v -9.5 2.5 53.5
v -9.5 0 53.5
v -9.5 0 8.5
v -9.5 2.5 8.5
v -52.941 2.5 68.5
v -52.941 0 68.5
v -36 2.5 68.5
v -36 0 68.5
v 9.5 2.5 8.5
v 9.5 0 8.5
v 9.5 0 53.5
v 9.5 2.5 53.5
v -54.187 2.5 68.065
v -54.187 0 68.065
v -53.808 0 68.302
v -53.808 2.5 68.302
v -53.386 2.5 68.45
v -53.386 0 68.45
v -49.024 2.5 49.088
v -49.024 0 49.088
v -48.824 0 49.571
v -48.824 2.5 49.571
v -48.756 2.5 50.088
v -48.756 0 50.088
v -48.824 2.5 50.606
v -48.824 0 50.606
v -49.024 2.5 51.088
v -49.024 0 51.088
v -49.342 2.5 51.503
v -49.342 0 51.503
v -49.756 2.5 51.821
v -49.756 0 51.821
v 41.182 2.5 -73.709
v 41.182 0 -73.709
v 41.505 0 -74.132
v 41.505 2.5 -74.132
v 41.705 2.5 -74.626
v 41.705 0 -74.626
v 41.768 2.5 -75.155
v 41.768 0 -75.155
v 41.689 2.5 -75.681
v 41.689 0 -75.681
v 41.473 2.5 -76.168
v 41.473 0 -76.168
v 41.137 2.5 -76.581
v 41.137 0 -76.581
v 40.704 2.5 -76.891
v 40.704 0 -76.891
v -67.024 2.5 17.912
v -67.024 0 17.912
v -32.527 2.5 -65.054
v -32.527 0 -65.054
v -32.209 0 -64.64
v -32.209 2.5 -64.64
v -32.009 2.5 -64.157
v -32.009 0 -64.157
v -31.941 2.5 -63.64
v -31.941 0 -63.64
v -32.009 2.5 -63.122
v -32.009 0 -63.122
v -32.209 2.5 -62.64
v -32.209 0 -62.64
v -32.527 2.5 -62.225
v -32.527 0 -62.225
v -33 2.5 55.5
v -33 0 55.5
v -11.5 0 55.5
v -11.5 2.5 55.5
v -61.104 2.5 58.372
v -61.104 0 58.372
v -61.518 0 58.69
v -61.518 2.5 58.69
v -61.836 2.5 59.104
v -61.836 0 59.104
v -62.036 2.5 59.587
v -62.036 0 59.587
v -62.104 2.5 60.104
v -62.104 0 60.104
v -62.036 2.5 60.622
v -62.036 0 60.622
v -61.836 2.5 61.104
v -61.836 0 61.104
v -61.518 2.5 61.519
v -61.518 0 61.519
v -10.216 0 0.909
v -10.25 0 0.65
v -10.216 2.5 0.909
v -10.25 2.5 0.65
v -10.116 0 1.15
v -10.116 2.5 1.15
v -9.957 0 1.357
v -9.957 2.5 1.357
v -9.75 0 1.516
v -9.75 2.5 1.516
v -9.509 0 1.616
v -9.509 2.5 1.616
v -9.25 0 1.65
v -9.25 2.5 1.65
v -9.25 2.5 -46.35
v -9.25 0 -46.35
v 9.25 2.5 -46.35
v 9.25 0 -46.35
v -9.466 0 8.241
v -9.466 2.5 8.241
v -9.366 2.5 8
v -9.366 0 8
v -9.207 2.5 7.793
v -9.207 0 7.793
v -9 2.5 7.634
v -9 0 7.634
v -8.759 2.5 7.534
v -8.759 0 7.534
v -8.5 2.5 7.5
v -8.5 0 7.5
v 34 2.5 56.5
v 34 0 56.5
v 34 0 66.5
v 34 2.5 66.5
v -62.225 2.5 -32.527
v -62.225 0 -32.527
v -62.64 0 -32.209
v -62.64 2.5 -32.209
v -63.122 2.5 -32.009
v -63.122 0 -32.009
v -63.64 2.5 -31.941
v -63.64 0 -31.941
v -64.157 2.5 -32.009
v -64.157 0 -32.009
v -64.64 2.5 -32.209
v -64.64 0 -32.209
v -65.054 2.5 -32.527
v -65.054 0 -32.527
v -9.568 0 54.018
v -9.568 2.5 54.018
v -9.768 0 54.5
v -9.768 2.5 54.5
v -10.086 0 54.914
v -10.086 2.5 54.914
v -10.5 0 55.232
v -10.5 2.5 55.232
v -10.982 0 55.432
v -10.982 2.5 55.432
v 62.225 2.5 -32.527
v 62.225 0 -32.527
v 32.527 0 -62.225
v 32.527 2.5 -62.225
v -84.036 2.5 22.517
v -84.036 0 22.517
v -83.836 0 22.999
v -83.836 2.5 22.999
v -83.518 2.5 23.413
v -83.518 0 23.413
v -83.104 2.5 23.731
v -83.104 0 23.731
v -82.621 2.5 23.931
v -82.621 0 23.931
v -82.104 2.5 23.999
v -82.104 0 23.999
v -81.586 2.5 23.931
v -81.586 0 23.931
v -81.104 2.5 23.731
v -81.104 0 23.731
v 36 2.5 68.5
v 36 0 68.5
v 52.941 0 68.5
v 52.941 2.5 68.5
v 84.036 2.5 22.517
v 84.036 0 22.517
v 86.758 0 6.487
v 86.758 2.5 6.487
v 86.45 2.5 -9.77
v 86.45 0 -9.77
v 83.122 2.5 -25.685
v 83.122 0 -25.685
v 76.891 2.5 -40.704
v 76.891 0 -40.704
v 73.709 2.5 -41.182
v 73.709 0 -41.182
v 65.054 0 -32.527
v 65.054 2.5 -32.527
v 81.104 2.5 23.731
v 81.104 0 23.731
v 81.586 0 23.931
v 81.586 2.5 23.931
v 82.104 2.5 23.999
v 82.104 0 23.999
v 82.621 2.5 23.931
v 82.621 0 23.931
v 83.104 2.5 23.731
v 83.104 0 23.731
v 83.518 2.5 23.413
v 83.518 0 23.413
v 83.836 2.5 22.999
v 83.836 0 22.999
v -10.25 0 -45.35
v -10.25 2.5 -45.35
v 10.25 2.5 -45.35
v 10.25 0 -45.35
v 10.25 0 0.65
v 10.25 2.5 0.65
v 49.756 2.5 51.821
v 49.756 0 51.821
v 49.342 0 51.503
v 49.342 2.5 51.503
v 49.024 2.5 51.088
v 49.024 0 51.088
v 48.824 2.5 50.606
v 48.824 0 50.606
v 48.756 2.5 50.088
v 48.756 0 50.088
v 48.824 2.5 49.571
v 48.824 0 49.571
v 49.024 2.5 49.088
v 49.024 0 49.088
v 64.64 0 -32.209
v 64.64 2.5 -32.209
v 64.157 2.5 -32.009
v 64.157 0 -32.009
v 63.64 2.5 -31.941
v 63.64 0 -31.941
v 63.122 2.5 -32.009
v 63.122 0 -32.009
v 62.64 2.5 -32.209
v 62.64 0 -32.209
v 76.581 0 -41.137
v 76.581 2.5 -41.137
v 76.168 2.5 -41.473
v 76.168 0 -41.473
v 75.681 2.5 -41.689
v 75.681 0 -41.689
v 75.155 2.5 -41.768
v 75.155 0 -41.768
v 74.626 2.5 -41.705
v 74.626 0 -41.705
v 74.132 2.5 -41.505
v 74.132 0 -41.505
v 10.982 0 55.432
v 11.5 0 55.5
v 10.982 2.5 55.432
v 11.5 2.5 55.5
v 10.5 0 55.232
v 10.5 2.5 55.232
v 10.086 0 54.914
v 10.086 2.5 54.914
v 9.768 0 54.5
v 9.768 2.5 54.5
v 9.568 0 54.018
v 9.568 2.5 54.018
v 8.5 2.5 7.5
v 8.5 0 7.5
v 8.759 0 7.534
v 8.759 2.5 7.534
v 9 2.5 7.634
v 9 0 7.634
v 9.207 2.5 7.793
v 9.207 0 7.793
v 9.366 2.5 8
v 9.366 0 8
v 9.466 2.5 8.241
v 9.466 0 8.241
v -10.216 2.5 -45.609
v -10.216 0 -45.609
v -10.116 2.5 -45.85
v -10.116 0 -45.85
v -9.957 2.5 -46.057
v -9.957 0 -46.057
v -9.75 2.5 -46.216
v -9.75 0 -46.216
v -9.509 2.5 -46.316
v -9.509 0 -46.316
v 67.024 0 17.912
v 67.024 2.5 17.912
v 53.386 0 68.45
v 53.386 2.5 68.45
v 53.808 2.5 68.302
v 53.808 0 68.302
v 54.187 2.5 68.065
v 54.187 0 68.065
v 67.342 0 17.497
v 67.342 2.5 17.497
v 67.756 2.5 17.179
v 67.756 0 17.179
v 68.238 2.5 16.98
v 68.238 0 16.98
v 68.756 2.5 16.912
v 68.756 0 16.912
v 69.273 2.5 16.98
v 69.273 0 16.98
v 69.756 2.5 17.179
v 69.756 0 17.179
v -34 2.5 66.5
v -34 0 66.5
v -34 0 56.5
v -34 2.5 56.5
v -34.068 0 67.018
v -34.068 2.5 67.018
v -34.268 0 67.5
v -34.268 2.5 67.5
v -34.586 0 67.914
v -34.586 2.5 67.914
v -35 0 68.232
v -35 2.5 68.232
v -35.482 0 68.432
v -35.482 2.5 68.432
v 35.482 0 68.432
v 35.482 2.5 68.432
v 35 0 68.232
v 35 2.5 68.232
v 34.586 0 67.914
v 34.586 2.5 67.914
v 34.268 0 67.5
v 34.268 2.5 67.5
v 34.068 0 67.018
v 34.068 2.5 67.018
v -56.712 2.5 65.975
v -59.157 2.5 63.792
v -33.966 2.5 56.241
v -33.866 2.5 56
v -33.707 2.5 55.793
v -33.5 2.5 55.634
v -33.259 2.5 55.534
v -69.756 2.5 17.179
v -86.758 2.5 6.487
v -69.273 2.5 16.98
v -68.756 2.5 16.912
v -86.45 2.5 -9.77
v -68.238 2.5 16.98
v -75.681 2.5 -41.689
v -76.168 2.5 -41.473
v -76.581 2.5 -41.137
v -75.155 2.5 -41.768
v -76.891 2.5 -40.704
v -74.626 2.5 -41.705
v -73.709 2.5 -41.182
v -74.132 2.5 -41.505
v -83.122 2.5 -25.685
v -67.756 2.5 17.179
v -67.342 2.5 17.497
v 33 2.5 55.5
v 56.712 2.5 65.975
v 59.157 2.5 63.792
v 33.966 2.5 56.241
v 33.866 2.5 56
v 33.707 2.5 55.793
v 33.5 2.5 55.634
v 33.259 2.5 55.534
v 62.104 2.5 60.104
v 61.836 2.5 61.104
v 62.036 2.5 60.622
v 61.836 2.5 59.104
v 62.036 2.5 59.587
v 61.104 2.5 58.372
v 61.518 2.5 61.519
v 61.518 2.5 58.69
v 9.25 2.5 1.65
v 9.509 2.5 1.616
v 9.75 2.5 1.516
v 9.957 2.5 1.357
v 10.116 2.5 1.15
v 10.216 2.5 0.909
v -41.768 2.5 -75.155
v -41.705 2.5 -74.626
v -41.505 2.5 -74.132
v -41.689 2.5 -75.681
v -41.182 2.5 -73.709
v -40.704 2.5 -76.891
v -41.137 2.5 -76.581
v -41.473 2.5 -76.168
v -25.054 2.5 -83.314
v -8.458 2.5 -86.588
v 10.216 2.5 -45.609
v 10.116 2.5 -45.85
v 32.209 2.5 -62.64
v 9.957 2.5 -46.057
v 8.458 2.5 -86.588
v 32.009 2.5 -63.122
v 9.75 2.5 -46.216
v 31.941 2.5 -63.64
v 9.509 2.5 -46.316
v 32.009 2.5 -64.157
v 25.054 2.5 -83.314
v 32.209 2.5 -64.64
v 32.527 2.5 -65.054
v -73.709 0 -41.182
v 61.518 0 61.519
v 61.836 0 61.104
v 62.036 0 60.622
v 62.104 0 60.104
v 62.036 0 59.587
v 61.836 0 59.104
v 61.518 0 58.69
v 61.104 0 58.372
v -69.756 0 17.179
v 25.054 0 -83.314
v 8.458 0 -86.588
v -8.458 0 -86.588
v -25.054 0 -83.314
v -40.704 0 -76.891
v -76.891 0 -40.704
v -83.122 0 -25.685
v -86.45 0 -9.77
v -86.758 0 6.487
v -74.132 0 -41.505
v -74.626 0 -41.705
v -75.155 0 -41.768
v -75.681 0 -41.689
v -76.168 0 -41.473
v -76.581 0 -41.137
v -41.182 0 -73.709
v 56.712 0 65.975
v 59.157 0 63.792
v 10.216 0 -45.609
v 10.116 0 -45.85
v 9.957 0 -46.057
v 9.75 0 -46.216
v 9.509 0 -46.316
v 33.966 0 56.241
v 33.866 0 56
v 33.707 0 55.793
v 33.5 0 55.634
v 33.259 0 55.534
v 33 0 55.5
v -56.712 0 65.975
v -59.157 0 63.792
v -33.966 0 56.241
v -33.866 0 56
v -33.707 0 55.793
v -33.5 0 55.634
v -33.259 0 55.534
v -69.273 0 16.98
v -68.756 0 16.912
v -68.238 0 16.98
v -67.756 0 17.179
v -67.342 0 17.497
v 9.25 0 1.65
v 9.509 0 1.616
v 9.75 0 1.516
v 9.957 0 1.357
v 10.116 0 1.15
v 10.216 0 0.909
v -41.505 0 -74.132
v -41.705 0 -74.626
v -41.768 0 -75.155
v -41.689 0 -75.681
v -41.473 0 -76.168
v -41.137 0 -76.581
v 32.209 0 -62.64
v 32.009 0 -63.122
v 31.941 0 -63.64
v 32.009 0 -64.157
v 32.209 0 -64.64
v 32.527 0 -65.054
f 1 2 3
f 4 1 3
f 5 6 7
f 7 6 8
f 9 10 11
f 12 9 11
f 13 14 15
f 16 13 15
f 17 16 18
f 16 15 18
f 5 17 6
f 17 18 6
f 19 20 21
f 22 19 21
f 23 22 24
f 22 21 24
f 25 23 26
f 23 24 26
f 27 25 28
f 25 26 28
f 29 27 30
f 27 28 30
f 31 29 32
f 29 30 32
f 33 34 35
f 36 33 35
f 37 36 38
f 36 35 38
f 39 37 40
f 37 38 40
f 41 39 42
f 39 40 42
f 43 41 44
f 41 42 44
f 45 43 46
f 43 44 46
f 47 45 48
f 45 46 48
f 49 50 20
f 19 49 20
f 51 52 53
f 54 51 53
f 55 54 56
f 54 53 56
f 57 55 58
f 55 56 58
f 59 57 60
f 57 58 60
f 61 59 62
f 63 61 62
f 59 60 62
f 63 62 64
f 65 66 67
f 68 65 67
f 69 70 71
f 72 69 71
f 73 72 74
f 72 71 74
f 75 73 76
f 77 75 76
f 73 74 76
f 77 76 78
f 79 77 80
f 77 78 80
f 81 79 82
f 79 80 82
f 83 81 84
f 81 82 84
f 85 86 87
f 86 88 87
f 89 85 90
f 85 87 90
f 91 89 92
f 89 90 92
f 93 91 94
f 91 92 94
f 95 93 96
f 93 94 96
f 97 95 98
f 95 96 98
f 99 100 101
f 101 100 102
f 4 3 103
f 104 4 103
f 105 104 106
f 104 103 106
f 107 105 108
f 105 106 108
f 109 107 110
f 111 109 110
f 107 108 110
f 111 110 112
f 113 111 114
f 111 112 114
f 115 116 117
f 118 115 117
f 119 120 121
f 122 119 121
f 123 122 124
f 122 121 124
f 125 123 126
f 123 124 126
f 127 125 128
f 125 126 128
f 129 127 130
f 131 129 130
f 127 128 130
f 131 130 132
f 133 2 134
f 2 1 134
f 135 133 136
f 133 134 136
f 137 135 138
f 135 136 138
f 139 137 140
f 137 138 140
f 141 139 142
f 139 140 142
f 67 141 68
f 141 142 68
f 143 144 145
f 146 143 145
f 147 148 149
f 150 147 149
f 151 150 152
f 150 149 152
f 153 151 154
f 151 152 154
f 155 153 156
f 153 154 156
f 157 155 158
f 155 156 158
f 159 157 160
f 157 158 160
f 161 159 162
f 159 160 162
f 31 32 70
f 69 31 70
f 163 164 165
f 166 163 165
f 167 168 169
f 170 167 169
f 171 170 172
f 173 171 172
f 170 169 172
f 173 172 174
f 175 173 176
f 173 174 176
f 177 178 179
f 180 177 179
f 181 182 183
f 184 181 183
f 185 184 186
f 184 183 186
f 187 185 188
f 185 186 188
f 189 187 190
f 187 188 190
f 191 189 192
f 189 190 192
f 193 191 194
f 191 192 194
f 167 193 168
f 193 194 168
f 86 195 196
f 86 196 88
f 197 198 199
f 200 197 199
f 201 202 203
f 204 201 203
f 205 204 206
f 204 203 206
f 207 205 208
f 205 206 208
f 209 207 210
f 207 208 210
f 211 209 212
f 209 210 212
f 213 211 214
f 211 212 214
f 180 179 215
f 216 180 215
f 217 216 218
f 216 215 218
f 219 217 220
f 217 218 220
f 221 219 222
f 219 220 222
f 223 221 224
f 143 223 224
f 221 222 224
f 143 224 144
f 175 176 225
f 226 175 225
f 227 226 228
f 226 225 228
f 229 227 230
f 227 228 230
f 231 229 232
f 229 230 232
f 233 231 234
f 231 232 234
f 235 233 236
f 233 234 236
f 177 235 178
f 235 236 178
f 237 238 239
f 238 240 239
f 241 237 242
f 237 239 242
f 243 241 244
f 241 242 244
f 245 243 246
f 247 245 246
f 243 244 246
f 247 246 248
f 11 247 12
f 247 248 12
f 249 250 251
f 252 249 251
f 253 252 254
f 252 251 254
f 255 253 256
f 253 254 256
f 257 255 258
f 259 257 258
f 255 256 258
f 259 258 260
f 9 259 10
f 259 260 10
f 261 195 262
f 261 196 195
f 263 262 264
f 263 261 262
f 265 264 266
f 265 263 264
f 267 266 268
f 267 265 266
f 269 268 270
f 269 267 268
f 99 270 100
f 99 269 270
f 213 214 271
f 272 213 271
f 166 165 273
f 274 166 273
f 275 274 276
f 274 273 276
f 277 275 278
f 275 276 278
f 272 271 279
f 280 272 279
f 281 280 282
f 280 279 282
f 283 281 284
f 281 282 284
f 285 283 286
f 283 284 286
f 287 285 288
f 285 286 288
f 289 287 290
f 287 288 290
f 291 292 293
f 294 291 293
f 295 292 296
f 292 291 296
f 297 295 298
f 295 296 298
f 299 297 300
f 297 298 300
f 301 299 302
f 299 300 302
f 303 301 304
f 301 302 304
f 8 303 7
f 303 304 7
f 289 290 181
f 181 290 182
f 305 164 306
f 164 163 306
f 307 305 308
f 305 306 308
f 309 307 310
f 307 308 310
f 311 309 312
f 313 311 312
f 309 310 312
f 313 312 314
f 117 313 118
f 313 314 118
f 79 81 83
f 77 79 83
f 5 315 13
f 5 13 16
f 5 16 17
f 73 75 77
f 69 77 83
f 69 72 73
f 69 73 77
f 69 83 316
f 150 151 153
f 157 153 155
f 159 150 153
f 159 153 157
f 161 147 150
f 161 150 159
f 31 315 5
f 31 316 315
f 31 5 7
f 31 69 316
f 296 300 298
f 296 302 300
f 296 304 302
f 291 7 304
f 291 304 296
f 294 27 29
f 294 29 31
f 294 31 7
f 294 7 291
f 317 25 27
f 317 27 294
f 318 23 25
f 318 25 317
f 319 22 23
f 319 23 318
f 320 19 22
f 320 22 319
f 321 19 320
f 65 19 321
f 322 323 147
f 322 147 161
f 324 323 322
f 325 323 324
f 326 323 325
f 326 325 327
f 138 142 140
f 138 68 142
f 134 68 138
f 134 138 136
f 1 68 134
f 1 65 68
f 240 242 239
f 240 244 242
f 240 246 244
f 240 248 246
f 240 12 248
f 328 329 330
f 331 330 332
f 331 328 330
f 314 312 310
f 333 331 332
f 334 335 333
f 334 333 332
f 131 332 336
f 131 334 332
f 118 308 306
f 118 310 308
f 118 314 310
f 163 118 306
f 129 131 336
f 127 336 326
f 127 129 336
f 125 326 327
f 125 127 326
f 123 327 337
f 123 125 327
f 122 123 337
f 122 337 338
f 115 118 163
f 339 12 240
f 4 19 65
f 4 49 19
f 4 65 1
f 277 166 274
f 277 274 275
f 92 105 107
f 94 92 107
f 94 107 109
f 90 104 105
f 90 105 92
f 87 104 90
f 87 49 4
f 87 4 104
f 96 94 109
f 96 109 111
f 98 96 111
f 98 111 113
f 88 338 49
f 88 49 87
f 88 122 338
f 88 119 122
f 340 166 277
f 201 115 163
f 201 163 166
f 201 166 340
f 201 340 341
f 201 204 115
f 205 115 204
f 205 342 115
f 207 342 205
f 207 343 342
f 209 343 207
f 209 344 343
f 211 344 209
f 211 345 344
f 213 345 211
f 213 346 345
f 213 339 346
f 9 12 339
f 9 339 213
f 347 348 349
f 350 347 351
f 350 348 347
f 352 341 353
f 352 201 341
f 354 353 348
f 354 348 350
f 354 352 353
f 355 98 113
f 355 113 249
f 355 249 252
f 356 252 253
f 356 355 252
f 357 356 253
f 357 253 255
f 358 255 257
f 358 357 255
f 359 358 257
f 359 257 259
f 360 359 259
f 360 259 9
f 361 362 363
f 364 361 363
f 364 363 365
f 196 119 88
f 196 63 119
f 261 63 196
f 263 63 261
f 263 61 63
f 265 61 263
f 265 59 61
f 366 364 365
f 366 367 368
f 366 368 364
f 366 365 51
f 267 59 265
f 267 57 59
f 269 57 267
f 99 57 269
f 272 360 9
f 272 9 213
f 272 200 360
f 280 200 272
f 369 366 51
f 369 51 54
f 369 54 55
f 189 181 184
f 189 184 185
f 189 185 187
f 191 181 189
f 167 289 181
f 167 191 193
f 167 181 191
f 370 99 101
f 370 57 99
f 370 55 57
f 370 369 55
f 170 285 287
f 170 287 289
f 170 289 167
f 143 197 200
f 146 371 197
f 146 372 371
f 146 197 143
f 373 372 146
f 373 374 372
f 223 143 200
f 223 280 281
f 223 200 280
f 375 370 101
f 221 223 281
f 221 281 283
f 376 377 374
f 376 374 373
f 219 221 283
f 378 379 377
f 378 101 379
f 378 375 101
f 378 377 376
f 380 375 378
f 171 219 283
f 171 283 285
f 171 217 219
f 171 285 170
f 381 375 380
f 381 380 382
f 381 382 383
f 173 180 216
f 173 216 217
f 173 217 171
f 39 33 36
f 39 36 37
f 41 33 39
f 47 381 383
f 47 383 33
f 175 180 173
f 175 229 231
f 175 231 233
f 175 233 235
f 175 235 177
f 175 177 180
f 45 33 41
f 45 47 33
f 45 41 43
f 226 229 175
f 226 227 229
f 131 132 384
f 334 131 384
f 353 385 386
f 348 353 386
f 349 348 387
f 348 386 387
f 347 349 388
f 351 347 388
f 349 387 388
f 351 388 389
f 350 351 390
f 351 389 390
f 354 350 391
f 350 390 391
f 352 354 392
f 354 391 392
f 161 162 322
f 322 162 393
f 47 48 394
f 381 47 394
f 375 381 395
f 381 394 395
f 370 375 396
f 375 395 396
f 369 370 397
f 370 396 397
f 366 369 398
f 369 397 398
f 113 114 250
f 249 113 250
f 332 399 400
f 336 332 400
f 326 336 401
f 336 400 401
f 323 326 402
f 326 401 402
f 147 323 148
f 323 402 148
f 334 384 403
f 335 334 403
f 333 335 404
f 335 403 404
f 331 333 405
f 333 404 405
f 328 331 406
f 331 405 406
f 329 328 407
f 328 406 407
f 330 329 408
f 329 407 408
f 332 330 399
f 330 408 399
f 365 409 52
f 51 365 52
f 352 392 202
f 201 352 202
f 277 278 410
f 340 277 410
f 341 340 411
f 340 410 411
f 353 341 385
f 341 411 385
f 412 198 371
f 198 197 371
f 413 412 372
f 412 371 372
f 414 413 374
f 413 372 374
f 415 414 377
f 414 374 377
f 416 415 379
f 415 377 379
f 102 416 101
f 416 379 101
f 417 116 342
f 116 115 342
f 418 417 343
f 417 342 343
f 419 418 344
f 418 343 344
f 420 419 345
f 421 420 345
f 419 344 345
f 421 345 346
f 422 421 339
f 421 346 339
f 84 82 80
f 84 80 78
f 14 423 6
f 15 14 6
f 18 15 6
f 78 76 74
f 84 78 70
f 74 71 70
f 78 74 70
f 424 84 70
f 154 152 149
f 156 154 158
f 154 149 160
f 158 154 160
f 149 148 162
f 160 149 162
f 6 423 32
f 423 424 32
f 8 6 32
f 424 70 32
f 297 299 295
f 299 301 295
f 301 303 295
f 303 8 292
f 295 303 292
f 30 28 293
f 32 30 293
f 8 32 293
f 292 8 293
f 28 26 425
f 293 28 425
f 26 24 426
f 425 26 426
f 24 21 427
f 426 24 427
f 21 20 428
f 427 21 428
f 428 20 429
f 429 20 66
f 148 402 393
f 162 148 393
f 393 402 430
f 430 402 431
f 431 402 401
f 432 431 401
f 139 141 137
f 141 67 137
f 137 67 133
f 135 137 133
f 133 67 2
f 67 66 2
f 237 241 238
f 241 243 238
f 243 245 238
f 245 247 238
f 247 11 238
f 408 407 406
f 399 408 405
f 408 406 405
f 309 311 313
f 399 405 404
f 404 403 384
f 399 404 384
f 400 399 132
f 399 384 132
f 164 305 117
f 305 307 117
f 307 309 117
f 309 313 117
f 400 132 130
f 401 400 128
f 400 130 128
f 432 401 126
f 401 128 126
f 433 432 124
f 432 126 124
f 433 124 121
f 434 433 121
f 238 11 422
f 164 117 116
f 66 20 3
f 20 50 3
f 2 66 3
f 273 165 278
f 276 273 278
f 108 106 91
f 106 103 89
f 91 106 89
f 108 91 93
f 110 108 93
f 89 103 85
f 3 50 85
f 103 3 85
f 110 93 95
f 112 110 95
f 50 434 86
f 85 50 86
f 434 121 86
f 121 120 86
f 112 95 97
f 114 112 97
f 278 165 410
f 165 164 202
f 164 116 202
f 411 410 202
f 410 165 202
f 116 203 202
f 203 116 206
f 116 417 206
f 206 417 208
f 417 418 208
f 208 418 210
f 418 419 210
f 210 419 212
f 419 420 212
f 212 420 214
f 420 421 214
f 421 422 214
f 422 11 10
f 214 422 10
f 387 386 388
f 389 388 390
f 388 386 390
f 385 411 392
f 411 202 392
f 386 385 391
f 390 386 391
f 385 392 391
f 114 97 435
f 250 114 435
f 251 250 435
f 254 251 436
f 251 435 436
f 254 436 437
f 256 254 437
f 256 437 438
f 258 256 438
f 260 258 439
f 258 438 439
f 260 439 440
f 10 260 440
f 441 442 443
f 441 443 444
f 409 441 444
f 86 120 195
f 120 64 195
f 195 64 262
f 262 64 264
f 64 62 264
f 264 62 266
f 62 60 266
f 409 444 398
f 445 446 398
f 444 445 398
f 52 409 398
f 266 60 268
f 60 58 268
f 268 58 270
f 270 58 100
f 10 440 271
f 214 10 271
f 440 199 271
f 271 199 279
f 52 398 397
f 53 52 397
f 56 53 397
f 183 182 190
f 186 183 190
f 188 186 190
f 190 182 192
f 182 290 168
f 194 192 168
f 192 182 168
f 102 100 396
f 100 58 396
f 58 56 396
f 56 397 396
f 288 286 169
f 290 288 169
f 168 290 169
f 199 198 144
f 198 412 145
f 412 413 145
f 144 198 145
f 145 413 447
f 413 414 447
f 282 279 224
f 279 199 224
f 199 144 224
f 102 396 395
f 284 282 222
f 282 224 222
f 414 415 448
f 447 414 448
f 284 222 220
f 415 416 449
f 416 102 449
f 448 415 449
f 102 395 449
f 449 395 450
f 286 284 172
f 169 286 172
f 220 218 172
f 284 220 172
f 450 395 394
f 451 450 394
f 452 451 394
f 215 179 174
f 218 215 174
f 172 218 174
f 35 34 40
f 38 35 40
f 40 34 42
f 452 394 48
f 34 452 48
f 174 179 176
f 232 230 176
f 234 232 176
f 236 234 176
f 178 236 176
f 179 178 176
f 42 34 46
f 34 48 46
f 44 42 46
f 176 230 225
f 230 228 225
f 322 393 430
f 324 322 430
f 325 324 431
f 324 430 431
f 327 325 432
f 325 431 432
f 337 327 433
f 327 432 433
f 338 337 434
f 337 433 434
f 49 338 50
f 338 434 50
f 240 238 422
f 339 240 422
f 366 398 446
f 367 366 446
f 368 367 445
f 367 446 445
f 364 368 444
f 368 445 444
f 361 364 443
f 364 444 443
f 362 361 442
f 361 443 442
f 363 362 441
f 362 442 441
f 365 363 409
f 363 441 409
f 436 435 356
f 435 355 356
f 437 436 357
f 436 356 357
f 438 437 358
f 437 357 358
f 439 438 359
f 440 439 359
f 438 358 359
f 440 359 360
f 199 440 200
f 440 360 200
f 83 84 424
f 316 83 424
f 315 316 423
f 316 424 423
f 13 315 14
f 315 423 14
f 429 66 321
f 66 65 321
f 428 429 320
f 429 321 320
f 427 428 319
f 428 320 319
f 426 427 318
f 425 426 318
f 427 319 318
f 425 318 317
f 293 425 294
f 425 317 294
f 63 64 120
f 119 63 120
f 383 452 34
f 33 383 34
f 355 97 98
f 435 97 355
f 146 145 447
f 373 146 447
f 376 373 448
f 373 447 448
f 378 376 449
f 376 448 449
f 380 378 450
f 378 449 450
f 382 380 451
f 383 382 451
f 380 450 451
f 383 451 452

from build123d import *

# Parameters (mm, degrees)
RESSALTO_EXTRUS_O1_DEPTH = 2.5
ESBO_O13_W               = 20.5
ESBO_O13_H               = 48
CORTE_EXTRUS_O8_DEPTH    = 124.061976256
FILETE1_R                = 2
FILETE2_R                = 1


# Read off the part's stored shape, not the designer's step: Ressalto-extrusão1
with BuildPart() as part:
    # Ressalto-extrusão1 outline → Ressalto-extrusão1 (new body)
    with BuildSketch(Plane(origin=(0, 0, 0), x_dir=(1, 0, 0), z_dir=(0, 1, 0))):
        with BuildLine():
            ThreePointArc((41.182170498, 73.709082433), (41.745717904, 75.420720863), (40.703673569, 76.89090296))
            ThreePointArc((40.703673569, 76.89090296), (0, 87), (-40.703673569, 76.89090296))
            ThreePointArc((-40.703673569, 76.89090296), (-41.745717904, 75.420720863), (-41.182170498, 73.709082433))
            Line((-41.182170498, 73.709082433), (-32.526911935, 65.053823869))
            ThreePointArc((-32.526911935, 65.053823869), (-31.941125497, 63.639610306), (-32.526911935, 62.225396744))
            Line((-32.526911935, 62.225396744), (-62.225396744, 32.526911935))
            ThreePointArc((-62.225396744, 32.526911935), (-63.639610306, 31.941125497), (-65.053823869, 32.526911935))
            Line((-65.053823869, 32.526911935), (-73.709082433, 41.182170498))
            ThreePointArc((-73.709082433, 41.182170498), (-75.420720863, 41.745717904), (-76.89090296, 40.703673569))
            ThreePointArc((-76.89090296, 40.703673569), (-86.449685697, 9.769945899), (-84.035651423, -22.516866789))
            ThreePointArc((-84.035651423, -22.516866789), (-82.869168521, -23.846994955), (-81.103797367, -23.731288475))
            Line((-81.103797367, -23.731288475), (-69.755752861, -17.179491924))
            ThreePointArc((-69.755752861, -17.179491924), (-68.238114771, -16.979691079), (-67.023702054, -17.911542732))
            Line((-67.023702054, -17.911542732), (-49.023702054, -49.088457268))
            ThreePointArc((-49.023702054, -49.088457268), (-48.823901209, -50.606095358), (-49.755752861, -51.820508076))
            Line((-49.755752861, -51.820508076), (-61.103797367, -58.372304626))
            ThreePointArc((-61.103797367, -58.372304626), (-62.086687696, -59.843307652), (-61.518004364, -61.518575561))
            ThreePointArc((-61.518004364, -61.518575561), (-57.944854795, -64.895252544), (-54.186675605, -68.064705882))
            ThreePointArc((-54.186675605, -68.064705882), (-53.600773132, -68.388042871), (-52.941004902, -68.5))
            Line((-52.941004902, -68.5), (52.941004902, -68.5))
            ThreePointArc((52.941004902, -68.5), (53.600773132, -68.388042871), (54.186675605, -68.064705882))
            ThreePointArc((54.186675605, -68.064705882), (57.944854795, -64.895252544), (61.518004364, -61.518575561))
            ThreePointArc((61.518004364, -61.518575561), (62.086687696, -59.843307652), (61.103797367, -58.372304626))
            Line((61.103797367, -58.372304626), (49.755752861, -51.820508076))
            ThreePointArc((49.755752861, -51.820508076), (48.823901209, -50.606095358), (49.023702054, -49.088457268))
            Line((49.023702054, -49.088457268), (67.023702054, -17.911542732))
            ThreePointArc((67.023702054, -17.911542732), (68.238114771, -16.979691079), (69.755752861, -17.179491924))
            Line((69.755752861, -17.179491924), (81.103797367, -23.731288475))
            ThreePointArc((81.103797367, -23.731288475), (82.869168521, -23.846994955), (84.035651423, -22.516866789))
            ThreePointArc((84.035651423, -22.516866789), (86.449685697, 9.769945899), (76.89090296, 40.703673569))
            ThreePointArc((76.89090296, 40.703673569), (75.420720863, 41.745717904), (73.709082433, 41.182170498))
            Line((73.709082433, 41.182170498), (65.053823869, 32.526911935))
            ThreePointArc((65.053823869, 32.526911935), (63.639610306, 31.941125497), (62.225396744, 32.526911935))
            Line((62.225396744, 32.526911935), (32.526911935, 62.225396744))
            ThreePointArc((32.526911935, 62.225396744), (31.941125497, 63.639610306), (32.526911935, 65.053823869))
            Line((32.526911935, 65.053823869), (41.182170498, 73.709082433))
        make_face()
    extrude(amount=RESSALTO_EXTRUS_O1_DEPTH)

    # Esboço13 → Corte-extrusão8 (cut, through all)
    with BuildSketch(Plane.XZ):
        with BuildLine():
            ThreePointArc((-9.5, 67.5), (-9.207106781, 68.207106781), (-8.5, 68.5))
            Line((-8.5, 68.5), (-34, 68.5))
            Line((-34, 68.5), (-34, 55.5))
            Line((-34, 55.5), (-9.5, 55.5))
            Line((-9.5, 55.5), (-9.5, 67.5))
        make_face()
        with BuildLine():
            Line((34, 68.5), (8.5, 68.5))
            ThreePointArc((8.5, 68.5), (9.207106781, 68.207106781), (9.5, 67.5))
            Line((9.5, 67.5), (9.5, 55.5))
            Line((9.5, 55.5), (34, 55.5))
            Line((34, 55.5), (34, 68.5))
        make_face()
        with BuildLine():
            Line((8.5, 68.5), (-8.5, 68.5))
            ThreePointArc((-8.5, 68.5), (-9.207106781, 68.207106781), (-9.5, 67.5))
            Line((-9.5, 67.5), (-9.5, 55.5))
            Line((-9.5, 55.5), (9.5, 55.5))
            Line((9.5, 55.5), (9.5, 67.5))
            ThreePointArc((9.5, 67.5), (9.207106781, 68.207106781), (8.5, 68.5))
        make_face()
        with BuildLine():
            Line((9.5, 55.5), (-9.5, 55.5))
            Line((-9.5, 55.5), (-9.5, 8.5))
            ThreePointArc((-9.5, 8.5), (-9.207106781, 7.792893219), (-8.5, 7.5))
            Line((-8.5, 7.5), (8.5, 7.5))
            ThreePointArc((8.5, 7.5), (9.207106781, 7.792893219), (9.5, 8.5))
            Line((9.5, 8.5), (9.5, 55.5))
        make_face()
        with Locations((0, -22.35)):
            Rectangle(ESBO_O13_W, ESBO_O13_H)
    extrude(amount=-CORTE_EXTRUS_O8_DEPTH, mode=Mode.SUBTRACT)

    # Filete1
    filete1_edges = [part.edges().sort_by_distance(p)[0] for p in [
        (-9.5, 1.25, 55.5),
        (-34, 1.25, 68.5),
        (34, 1.25, 68.5),
        (9.5, 1.25, 55.5),
    ]]
    fillet(filete1_edges, radius=FILETE1_R)

    # Filete2
    filete2_edges = [part.edges().sort_by_distance(p)[0] for p in [
        (-34, 1.25, 55.5),
        (34, 1.25, 55.5),
        (-10.25, 1.25, 1.65),
        (10.25, 1.25, 1.65),
        (10.25, 1.25, -46.35),
        (-10.25, 1.25, -46.35),
    ]]
    fillet(filete2_edges, radius=FILETE2_R)


solid = part.part
